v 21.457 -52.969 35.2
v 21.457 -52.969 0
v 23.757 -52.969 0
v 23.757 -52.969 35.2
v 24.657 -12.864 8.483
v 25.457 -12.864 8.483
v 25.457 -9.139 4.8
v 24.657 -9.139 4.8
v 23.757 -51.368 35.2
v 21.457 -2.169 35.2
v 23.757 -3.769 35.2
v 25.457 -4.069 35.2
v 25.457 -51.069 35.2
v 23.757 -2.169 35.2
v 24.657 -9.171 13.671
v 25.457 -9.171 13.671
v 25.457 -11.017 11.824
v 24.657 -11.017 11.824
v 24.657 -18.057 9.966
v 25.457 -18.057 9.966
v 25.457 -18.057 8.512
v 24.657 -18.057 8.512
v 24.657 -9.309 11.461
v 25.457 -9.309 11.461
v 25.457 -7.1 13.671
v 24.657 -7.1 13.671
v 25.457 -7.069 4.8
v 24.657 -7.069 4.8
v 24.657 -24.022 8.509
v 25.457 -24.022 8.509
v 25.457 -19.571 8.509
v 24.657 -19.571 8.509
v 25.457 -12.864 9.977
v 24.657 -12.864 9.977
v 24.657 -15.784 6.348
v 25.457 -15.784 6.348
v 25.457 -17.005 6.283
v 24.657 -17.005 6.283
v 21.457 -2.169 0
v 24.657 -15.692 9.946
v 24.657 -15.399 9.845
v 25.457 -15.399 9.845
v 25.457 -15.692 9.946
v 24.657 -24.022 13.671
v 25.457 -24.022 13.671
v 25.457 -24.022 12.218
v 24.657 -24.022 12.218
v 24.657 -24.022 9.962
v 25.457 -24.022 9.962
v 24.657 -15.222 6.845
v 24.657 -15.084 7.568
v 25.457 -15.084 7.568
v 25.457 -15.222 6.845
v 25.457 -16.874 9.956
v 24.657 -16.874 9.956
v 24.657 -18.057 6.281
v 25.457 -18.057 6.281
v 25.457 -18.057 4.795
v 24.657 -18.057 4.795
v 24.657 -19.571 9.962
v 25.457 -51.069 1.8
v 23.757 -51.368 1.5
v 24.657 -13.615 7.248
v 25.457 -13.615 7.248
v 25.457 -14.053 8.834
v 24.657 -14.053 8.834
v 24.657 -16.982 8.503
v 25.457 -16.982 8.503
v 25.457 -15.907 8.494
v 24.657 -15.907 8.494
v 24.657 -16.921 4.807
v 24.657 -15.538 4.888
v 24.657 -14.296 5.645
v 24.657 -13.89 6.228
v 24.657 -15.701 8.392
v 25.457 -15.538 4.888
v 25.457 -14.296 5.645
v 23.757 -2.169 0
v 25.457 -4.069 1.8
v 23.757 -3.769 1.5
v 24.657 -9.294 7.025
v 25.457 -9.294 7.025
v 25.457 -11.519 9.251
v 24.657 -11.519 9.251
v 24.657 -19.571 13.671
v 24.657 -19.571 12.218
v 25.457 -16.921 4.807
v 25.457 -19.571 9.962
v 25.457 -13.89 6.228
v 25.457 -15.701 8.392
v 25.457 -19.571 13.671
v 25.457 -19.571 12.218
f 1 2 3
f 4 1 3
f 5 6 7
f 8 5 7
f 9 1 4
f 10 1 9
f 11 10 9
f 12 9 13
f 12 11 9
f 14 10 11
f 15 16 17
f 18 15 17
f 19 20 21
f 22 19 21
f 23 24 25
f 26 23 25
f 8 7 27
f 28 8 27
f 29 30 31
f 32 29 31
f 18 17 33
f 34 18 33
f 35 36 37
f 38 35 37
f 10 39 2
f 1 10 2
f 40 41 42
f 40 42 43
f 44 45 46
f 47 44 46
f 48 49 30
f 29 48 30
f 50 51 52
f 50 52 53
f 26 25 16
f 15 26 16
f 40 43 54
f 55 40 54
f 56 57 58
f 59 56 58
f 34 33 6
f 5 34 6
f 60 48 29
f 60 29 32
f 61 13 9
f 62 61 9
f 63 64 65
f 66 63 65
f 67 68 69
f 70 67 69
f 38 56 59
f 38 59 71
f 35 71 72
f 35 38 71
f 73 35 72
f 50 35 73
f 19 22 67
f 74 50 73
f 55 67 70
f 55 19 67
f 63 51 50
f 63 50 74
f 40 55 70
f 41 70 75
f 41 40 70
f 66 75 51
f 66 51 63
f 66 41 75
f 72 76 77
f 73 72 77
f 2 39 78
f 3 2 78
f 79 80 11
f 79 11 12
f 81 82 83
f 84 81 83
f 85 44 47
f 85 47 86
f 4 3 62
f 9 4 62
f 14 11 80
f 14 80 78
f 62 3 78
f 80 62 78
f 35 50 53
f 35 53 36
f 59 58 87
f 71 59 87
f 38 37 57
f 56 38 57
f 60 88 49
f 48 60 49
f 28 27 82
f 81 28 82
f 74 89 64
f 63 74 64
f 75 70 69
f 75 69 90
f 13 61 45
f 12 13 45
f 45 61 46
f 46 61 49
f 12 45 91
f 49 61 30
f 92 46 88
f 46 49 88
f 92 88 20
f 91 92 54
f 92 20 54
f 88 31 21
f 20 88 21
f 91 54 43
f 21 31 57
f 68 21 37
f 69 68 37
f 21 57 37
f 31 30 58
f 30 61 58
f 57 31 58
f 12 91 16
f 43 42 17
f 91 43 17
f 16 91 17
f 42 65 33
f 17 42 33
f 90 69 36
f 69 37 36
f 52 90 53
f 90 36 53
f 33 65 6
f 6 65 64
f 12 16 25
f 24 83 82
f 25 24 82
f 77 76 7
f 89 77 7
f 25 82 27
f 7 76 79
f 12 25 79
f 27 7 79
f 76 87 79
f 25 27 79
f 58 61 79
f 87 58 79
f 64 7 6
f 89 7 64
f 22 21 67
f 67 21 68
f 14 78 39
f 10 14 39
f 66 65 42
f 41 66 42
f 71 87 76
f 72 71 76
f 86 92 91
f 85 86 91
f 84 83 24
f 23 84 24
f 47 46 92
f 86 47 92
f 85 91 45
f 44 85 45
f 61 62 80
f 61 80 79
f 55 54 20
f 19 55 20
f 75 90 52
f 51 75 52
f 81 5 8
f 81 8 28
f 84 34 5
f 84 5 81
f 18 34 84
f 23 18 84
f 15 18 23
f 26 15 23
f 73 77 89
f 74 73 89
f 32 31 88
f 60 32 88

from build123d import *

# Parameters (mm, degrees)
F0_W         = 1.7
F0_H         = 47.6
F1_DEPTH     = 35.2
F2_DEPTH     = 1.5
F3_T4_DEPTH  = 42.5422275002
F3_T9_DEPTH  = 56.4422275002
F3_T14_DEPTH = 42.5422275002
F5_DEPTH     = 0.8


# Not quite as in the source:
# - a fillet or chamfer that OpenCascade refuses, or shapes differently, is made with other operations: its cross-section is extruded or revolved along the edge and cut away or added
# - ends of sketch curves that miss each other by under 0.0002 mm in the source are joined


with BuildPart() as f1:
    # F0 (on Top) → F1 (new body)
    with BuildSketch(Plane.XY):
        Polygon((21.457163617, -2.1686828911), (21.457163617, -52.9686828911), (23.757163617, -52.9686828911), (23.757163617, -51.3686828911), (23.757163617, -3.7686828911), (23.757163617, -2.1686828911), align=None)
        with Locations((24.607163617, -27.5686828911)):
            Rectangle(F0_W, F0_H)
    extrude(amount=F1_DEPTH)

    # F0 (on Top) → F2 (cut)
    with BuildSketch(Plane.XY):
        with Locations((24.607163617, -27.5686828911)):
            Rectangle(F0_W, F0_H)
    extrude(amount=F2_DEPTH, mode=Mode.SUBTRACT)

    # F3: chamfer of 0.3 x 1.7013845459 on 3 edges, made by hand


with BuildPart() as f3_tool2:
    # F3_s3 → F3_t4 (new body)
    with BuildSketch(Plane.XY.offset(-2.9211137501)):
        Polygon((25.457163617, -51.0686828911), (23.7557790711, -51.3686828911), (25.457163617, -51.3686828911), align=None)
    extrude(amount=F3_T4_DEPTH)

    split(bisect_by=Plane.YZ.offset(23.757163617), keep=Keep.TOP)


with BuildPart() as f1_1:
    add(f1.part)

    # F3_t1: cut F3_tool2
    add(f3_tool2.part, mode=Mode.SUBTRACT)


with BuildPart() as f3_tool7:
    # F3_s8 → F3_t9 (new body)
    with BuildSketch(Plane.XZ.offset(55.7897966412)):
        Polygon((23.7557790711, 1.5), (25.457163617, 1.8), (25.457163617, 1.5), align=None)
    extrude(amount=-F3_T9_DEPTH)

    split(bisect_by=Plane.YZ.offset(23.757163617), keep=Keep.TOP)


with BuildPart() as f1_2:
    add(f1_1.part)

    # F3_t6: cut F3_tool7
    add(f3_tool7.part, mode=Mode.SUBTRACT)


with BuildPart() as f3_tool12:
    # F3_s13 → F3_t14 (new body)
    with BuildSketch(Plane.XY.offset(-2.9211137501)):
        Polygon((23.7557790711, -3.7686828911), (25.457163617, -4.0686828911), (25.457163617, -3.7686828911), align=None)
    extrude(amount=F3_T14_DEPTH)

    split(bisect_by=Plane.YZ.offset(23.757163617), keep=Keep.TOP)


with BuildPart() as f1_3:
    add(f1_2.part)

    # F3_t11: cut F3_tool12
    add(f3_tool12.part, mode=Mode.SUBTRACT)

    # F4 (on face) → F5 (cut)
    with BuildSketch(Plane.YZ.offset(25.457163617)):
        Polygon((-24.0221414911, 13.6708992), (-24.0221414911, 12.9445354), (-24.0221414911, 12.2181716), (-21.7966950911, 12.2181716), (-19.5712486911, 12.2181716), (-19.5712486911, 12.9445354), (-19.5712486911, 13.6708992), (-21.7966950911, 13.6708992), align=None)
        Polygon((-24.0221414911, 9.9618134), (-24.0221414911, 9.2354496), (-24.0221414911, 8.5090858), (-21.7966950911, 8.5090858), (-19.5712486911, 8.5090858), (-19.5712486911, 9.2354496), (-19.5712486911, 9.9618134), (-21.7966950911, 9.9618134), align=None)
        Polygon((-18.0566974911, 6.280566), (-18.0566974911, 5.5376414), (-18.0566974911, 4.7947676), (-16.9207840911, 4.807493), (-15.5376016911, 4.8880872), (-14.2955670911, 5.6452866), (-13.8898274911, 6.2280134), (-13.6151518911, 7.2483822), (-14.0528446911, 8.8343074), (-15.3985112911, 9.8445416), (-15.6921352911, 9.9462178), (-16.8744290911, 9.9559968), (-18.0566974911, 9.9658012), (-18.0566974911, 9.2389548), (-18.0566974911, 8.512083), (-16.9818456911, 8.5028628), (-15.9070192911, 8.4936172), (-15.7007458911, 8.3920426), (-15.0843894911, 7.5677364), (-15.2217272911, 6.8451064), (-15.7842102911, 6.3483586), (-17.0050104911, 6.2828266), align=None)
        Polygon((-12.8639722911, 8.4833048), (-11.0016950911, 6.6416524), (-9.1394178911, 4.8), (-8.1040376911, 4.8), (-7.0686828911, 4.8), (-9.2939768911, 7.0254464), (-11.5192454911, 9.2508928), (-9.3094200911, 11.460896), (-7.0995692911, 13.6708992), (-8.1350510911, 13.6708992), (-9.1705328911, 13.6708992), (-11.0172398911, 11.823989), (-12.8639722911, 9.9770788), (-12.8639722911, 9.2301918), align=None)
    extrude(amount=-F5_DEPTH, mode=Mode.SUBTRACT)


solid = f1_3.part
